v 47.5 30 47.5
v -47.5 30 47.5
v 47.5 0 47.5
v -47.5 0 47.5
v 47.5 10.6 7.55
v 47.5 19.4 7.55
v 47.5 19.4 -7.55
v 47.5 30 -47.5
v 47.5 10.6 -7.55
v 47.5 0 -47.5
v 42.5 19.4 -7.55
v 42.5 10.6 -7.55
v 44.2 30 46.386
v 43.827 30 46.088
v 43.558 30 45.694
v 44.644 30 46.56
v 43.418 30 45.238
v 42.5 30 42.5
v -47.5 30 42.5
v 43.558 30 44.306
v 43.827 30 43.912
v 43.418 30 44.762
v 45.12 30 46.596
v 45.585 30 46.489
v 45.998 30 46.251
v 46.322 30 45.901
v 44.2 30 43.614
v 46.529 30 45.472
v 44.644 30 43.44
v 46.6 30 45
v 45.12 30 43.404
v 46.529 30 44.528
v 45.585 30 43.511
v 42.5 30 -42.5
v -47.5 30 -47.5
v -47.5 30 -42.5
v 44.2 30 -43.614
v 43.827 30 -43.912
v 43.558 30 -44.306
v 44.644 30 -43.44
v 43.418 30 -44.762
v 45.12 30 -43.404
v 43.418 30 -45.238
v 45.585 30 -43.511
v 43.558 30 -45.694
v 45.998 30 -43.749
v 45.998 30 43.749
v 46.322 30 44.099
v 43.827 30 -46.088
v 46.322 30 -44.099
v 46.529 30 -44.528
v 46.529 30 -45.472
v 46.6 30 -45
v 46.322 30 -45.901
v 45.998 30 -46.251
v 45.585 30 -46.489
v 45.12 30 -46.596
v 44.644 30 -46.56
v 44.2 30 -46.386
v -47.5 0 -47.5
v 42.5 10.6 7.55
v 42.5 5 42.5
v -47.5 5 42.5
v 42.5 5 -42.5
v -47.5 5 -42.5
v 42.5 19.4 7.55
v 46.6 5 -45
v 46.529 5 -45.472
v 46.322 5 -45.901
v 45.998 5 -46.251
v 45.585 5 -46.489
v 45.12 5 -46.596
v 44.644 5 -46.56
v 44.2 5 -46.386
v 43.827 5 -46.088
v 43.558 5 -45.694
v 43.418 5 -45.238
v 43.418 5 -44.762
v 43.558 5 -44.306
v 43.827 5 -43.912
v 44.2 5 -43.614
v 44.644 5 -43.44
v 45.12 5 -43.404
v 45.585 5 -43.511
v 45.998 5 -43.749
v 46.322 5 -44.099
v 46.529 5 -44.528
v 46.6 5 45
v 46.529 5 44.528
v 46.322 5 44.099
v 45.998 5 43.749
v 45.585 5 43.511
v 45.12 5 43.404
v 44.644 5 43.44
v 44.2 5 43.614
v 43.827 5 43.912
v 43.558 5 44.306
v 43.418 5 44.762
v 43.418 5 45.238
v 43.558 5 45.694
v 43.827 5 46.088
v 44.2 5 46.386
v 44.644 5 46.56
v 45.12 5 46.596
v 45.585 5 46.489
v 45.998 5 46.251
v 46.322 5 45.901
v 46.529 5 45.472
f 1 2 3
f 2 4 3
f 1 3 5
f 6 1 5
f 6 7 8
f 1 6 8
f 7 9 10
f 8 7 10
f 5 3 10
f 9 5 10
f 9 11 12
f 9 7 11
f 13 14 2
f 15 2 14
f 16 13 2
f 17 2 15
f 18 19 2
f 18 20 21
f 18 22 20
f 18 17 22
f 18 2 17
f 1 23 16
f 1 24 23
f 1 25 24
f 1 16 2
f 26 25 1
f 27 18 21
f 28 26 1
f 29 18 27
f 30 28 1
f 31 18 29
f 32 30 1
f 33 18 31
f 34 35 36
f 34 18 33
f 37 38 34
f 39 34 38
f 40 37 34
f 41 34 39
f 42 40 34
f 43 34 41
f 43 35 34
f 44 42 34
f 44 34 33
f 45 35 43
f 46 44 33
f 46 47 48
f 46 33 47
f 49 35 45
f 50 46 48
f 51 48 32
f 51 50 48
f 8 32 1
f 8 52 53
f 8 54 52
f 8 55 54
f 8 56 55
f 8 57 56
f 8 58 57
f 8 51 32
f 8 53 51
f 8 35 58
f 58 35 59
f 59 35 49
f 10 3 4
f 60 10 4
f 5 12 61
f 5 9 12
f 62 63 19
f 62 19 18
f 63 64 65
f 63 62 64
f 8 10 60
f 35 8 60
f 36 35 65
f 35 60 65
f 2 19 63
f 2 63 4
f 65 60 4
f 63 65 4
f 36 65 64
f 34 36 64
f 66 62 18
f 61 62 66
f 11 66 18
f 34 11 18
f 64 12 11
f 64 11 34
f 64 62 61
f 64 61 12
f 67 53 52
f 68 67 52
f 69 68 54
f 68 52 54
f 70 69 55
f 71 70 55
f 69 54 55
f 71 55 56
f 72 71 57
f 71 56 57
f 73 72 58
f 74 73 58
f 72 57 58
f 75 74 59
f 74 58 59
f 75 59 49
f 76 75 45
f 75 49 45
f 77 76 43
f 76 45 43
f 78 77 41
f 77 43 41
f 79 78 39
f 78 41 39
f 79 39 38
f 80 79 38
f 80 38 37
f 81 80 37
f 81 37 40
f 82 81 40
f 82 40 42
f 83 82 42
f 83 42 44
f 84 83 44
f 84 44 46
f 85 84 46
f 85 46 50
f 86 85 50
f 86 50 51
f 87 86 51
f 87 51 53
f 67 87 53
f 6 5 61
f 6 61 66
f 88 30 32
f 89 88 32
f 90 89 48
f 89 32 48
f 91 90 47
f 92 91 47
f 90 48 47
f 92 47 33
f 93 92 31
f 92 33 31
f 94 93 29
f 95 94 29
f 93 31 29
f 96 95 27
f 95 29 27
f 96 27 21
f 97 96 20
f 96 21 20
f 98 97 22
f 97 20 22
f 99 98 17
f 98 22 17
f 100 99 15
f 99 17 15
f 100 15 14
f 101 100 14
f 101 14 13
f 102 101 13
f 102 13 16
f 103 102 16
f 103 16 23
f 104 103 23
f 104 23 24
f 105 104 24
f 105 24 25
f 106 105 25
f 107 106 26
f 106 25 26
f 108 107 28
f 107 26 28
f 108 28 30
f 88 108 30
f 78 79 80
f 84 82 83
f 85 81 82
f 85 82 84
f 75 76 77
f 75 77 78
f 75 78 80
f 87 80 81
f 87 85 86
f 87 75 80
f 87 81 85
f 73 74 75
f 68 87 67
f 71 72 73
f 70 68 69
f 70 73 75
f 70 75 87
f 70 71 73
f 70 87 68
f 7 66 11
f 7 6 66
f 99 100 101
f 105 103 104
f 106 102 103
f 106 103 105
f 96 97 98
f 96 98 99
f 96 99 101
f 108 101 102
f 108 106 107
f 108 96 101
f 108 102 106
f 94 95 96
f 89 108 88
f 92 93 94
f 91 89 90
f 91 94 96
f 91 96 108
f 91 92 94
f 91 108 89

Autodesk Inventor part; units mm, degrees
ref_plane "YZ Plane" through (0, 0, 0) normal (1, 0, 0) x (0, 1, 0)
ref_plane "XZ Plane" through (0, 0, 0) normal (0, 1, 0) x (-1, 0, 0)
ref_plane "XY Plane" through (0, 0, 0) normal (0, 0, 1) x (1, 0, 0)
sketch "Sketch4" plane through (0, 0, 0) normal (0, 1, 0) x (-1, 0, 0)
  line L0 (-47.5, -47.5) -> (47.5, -47.5)
  line L1 (47.5, -47.5) -> (47.5, 47.5)
  line L2 (47.5, 47.5) -> (-47.5, 47.5)
  line L3 (-47.5, 47.5) -> (-47.5, -47.5)
  line L4 (-47.5, -47.5) -> (47.5, 47.5) construction
  line L5 (47.5, -47.5) -> (-47.5, 47.5) construction
  point P0 (0, 0)
  dimension "d24" = 95
  dimension "d25" = 95
extrude "Extrusion4" add sketch "Sketch4" along normal blind 5
sketch "Sketch5" plane through (0, 5, 0) normal (0, 1, 0) x (1, 0, 0)
  line L0 (-47.5, 47.5) -> (-47.5, -47.5) projected
  line L1 (-47.5, -42.5) -> (42.5, -42.5)
  line L2 (47.5, -47.5) -> (47.5, 47.5) projected
  line L3 (-47.5, -47.5) -> (47.5, -47.5) projected
  line L4 (42.5, -42.5) -> (42.5, 42.5)
  line L5 (-47.5, 42.5) -> (42.5, 42.5)
  line L6 (47.5, 47.5) -> (-47.5, 47.5) projected
  point P0 (0, 0)
  dimension "d28" = 5
  dimension "d29" = 5
  dimension "d30" = 5
extrude "Extrusion5" add sketch "Sketch5" along normal blind 25 contours L6 L2 L3 L0 L1 L4 L5
sketch "Sketch6" plane through (0, 30, 0) normal (0, 1, 0) x (1, 0, 0)
  circle A0 centre (45, -45) radius 1.6
  circle A1 centre (45, 45) radius 1.6
  line L0 (47.5, -47.5) -> (47.5, 47.5) projected
  line L1 (-47.5, -47.5) -> (47.5, -47.5) projected
  line L2 (47.5, 47.5) -> (-47.5, 47.5) projected
  point P0 (0, 0)
  dimension "d33" = 3.2
  dimension "d34" = 3.2
  dimension "d35" = 2.5
  dimension "d36" = 2.5
  dimension "d37" = 2.5
  dimension "d38" = 2.5
extrude "Extrusion6" cut sketch "Sketch6" against normal blind 25
sketch "Sketch7" plane through (47.5, 0, 47.5) normal (1, 0, 0) x (0, 0, -1)
  line L0 (39.95, 19.4) -> (55.05, 19.4)
  line L1 (55.05, 19.4) -> (55.05, 10.6)
  line L2 (55.05, 10.6) -> (39.95, 10.6)
  line L3 (39.95, 10.6) -> (39.95, 19.4)
  line L4 (39.95, 19.4) -> (55.05, 10.6) construction
  line L5 (55.05, 19.4) -> (39.95, 10.6) construction
  line L6 (0, 0) -> (95, 0) projected
  line L7 (0, 30) -> (95, 30) projected
  line L8 (0, 0) -> (0, 30) projected
  line L9 (95, 0) -> (95, 30) projected
  point P0 (47.5, 0)
  point P1 (47.5, 15)
  dimension "d41" = 15.1
  dimension "d42" = 8.8
  dimension "d43" = 10.6
  dimension "d44" = 10.6
  dimension "d45" = 39.95
  dimension "d46" = 39.95
extrude "Extrusion7" cut sketch "Sketch7" against normal blind 25 contours L0 L1 L2 L3
properties part number "Caja_Bateria"
